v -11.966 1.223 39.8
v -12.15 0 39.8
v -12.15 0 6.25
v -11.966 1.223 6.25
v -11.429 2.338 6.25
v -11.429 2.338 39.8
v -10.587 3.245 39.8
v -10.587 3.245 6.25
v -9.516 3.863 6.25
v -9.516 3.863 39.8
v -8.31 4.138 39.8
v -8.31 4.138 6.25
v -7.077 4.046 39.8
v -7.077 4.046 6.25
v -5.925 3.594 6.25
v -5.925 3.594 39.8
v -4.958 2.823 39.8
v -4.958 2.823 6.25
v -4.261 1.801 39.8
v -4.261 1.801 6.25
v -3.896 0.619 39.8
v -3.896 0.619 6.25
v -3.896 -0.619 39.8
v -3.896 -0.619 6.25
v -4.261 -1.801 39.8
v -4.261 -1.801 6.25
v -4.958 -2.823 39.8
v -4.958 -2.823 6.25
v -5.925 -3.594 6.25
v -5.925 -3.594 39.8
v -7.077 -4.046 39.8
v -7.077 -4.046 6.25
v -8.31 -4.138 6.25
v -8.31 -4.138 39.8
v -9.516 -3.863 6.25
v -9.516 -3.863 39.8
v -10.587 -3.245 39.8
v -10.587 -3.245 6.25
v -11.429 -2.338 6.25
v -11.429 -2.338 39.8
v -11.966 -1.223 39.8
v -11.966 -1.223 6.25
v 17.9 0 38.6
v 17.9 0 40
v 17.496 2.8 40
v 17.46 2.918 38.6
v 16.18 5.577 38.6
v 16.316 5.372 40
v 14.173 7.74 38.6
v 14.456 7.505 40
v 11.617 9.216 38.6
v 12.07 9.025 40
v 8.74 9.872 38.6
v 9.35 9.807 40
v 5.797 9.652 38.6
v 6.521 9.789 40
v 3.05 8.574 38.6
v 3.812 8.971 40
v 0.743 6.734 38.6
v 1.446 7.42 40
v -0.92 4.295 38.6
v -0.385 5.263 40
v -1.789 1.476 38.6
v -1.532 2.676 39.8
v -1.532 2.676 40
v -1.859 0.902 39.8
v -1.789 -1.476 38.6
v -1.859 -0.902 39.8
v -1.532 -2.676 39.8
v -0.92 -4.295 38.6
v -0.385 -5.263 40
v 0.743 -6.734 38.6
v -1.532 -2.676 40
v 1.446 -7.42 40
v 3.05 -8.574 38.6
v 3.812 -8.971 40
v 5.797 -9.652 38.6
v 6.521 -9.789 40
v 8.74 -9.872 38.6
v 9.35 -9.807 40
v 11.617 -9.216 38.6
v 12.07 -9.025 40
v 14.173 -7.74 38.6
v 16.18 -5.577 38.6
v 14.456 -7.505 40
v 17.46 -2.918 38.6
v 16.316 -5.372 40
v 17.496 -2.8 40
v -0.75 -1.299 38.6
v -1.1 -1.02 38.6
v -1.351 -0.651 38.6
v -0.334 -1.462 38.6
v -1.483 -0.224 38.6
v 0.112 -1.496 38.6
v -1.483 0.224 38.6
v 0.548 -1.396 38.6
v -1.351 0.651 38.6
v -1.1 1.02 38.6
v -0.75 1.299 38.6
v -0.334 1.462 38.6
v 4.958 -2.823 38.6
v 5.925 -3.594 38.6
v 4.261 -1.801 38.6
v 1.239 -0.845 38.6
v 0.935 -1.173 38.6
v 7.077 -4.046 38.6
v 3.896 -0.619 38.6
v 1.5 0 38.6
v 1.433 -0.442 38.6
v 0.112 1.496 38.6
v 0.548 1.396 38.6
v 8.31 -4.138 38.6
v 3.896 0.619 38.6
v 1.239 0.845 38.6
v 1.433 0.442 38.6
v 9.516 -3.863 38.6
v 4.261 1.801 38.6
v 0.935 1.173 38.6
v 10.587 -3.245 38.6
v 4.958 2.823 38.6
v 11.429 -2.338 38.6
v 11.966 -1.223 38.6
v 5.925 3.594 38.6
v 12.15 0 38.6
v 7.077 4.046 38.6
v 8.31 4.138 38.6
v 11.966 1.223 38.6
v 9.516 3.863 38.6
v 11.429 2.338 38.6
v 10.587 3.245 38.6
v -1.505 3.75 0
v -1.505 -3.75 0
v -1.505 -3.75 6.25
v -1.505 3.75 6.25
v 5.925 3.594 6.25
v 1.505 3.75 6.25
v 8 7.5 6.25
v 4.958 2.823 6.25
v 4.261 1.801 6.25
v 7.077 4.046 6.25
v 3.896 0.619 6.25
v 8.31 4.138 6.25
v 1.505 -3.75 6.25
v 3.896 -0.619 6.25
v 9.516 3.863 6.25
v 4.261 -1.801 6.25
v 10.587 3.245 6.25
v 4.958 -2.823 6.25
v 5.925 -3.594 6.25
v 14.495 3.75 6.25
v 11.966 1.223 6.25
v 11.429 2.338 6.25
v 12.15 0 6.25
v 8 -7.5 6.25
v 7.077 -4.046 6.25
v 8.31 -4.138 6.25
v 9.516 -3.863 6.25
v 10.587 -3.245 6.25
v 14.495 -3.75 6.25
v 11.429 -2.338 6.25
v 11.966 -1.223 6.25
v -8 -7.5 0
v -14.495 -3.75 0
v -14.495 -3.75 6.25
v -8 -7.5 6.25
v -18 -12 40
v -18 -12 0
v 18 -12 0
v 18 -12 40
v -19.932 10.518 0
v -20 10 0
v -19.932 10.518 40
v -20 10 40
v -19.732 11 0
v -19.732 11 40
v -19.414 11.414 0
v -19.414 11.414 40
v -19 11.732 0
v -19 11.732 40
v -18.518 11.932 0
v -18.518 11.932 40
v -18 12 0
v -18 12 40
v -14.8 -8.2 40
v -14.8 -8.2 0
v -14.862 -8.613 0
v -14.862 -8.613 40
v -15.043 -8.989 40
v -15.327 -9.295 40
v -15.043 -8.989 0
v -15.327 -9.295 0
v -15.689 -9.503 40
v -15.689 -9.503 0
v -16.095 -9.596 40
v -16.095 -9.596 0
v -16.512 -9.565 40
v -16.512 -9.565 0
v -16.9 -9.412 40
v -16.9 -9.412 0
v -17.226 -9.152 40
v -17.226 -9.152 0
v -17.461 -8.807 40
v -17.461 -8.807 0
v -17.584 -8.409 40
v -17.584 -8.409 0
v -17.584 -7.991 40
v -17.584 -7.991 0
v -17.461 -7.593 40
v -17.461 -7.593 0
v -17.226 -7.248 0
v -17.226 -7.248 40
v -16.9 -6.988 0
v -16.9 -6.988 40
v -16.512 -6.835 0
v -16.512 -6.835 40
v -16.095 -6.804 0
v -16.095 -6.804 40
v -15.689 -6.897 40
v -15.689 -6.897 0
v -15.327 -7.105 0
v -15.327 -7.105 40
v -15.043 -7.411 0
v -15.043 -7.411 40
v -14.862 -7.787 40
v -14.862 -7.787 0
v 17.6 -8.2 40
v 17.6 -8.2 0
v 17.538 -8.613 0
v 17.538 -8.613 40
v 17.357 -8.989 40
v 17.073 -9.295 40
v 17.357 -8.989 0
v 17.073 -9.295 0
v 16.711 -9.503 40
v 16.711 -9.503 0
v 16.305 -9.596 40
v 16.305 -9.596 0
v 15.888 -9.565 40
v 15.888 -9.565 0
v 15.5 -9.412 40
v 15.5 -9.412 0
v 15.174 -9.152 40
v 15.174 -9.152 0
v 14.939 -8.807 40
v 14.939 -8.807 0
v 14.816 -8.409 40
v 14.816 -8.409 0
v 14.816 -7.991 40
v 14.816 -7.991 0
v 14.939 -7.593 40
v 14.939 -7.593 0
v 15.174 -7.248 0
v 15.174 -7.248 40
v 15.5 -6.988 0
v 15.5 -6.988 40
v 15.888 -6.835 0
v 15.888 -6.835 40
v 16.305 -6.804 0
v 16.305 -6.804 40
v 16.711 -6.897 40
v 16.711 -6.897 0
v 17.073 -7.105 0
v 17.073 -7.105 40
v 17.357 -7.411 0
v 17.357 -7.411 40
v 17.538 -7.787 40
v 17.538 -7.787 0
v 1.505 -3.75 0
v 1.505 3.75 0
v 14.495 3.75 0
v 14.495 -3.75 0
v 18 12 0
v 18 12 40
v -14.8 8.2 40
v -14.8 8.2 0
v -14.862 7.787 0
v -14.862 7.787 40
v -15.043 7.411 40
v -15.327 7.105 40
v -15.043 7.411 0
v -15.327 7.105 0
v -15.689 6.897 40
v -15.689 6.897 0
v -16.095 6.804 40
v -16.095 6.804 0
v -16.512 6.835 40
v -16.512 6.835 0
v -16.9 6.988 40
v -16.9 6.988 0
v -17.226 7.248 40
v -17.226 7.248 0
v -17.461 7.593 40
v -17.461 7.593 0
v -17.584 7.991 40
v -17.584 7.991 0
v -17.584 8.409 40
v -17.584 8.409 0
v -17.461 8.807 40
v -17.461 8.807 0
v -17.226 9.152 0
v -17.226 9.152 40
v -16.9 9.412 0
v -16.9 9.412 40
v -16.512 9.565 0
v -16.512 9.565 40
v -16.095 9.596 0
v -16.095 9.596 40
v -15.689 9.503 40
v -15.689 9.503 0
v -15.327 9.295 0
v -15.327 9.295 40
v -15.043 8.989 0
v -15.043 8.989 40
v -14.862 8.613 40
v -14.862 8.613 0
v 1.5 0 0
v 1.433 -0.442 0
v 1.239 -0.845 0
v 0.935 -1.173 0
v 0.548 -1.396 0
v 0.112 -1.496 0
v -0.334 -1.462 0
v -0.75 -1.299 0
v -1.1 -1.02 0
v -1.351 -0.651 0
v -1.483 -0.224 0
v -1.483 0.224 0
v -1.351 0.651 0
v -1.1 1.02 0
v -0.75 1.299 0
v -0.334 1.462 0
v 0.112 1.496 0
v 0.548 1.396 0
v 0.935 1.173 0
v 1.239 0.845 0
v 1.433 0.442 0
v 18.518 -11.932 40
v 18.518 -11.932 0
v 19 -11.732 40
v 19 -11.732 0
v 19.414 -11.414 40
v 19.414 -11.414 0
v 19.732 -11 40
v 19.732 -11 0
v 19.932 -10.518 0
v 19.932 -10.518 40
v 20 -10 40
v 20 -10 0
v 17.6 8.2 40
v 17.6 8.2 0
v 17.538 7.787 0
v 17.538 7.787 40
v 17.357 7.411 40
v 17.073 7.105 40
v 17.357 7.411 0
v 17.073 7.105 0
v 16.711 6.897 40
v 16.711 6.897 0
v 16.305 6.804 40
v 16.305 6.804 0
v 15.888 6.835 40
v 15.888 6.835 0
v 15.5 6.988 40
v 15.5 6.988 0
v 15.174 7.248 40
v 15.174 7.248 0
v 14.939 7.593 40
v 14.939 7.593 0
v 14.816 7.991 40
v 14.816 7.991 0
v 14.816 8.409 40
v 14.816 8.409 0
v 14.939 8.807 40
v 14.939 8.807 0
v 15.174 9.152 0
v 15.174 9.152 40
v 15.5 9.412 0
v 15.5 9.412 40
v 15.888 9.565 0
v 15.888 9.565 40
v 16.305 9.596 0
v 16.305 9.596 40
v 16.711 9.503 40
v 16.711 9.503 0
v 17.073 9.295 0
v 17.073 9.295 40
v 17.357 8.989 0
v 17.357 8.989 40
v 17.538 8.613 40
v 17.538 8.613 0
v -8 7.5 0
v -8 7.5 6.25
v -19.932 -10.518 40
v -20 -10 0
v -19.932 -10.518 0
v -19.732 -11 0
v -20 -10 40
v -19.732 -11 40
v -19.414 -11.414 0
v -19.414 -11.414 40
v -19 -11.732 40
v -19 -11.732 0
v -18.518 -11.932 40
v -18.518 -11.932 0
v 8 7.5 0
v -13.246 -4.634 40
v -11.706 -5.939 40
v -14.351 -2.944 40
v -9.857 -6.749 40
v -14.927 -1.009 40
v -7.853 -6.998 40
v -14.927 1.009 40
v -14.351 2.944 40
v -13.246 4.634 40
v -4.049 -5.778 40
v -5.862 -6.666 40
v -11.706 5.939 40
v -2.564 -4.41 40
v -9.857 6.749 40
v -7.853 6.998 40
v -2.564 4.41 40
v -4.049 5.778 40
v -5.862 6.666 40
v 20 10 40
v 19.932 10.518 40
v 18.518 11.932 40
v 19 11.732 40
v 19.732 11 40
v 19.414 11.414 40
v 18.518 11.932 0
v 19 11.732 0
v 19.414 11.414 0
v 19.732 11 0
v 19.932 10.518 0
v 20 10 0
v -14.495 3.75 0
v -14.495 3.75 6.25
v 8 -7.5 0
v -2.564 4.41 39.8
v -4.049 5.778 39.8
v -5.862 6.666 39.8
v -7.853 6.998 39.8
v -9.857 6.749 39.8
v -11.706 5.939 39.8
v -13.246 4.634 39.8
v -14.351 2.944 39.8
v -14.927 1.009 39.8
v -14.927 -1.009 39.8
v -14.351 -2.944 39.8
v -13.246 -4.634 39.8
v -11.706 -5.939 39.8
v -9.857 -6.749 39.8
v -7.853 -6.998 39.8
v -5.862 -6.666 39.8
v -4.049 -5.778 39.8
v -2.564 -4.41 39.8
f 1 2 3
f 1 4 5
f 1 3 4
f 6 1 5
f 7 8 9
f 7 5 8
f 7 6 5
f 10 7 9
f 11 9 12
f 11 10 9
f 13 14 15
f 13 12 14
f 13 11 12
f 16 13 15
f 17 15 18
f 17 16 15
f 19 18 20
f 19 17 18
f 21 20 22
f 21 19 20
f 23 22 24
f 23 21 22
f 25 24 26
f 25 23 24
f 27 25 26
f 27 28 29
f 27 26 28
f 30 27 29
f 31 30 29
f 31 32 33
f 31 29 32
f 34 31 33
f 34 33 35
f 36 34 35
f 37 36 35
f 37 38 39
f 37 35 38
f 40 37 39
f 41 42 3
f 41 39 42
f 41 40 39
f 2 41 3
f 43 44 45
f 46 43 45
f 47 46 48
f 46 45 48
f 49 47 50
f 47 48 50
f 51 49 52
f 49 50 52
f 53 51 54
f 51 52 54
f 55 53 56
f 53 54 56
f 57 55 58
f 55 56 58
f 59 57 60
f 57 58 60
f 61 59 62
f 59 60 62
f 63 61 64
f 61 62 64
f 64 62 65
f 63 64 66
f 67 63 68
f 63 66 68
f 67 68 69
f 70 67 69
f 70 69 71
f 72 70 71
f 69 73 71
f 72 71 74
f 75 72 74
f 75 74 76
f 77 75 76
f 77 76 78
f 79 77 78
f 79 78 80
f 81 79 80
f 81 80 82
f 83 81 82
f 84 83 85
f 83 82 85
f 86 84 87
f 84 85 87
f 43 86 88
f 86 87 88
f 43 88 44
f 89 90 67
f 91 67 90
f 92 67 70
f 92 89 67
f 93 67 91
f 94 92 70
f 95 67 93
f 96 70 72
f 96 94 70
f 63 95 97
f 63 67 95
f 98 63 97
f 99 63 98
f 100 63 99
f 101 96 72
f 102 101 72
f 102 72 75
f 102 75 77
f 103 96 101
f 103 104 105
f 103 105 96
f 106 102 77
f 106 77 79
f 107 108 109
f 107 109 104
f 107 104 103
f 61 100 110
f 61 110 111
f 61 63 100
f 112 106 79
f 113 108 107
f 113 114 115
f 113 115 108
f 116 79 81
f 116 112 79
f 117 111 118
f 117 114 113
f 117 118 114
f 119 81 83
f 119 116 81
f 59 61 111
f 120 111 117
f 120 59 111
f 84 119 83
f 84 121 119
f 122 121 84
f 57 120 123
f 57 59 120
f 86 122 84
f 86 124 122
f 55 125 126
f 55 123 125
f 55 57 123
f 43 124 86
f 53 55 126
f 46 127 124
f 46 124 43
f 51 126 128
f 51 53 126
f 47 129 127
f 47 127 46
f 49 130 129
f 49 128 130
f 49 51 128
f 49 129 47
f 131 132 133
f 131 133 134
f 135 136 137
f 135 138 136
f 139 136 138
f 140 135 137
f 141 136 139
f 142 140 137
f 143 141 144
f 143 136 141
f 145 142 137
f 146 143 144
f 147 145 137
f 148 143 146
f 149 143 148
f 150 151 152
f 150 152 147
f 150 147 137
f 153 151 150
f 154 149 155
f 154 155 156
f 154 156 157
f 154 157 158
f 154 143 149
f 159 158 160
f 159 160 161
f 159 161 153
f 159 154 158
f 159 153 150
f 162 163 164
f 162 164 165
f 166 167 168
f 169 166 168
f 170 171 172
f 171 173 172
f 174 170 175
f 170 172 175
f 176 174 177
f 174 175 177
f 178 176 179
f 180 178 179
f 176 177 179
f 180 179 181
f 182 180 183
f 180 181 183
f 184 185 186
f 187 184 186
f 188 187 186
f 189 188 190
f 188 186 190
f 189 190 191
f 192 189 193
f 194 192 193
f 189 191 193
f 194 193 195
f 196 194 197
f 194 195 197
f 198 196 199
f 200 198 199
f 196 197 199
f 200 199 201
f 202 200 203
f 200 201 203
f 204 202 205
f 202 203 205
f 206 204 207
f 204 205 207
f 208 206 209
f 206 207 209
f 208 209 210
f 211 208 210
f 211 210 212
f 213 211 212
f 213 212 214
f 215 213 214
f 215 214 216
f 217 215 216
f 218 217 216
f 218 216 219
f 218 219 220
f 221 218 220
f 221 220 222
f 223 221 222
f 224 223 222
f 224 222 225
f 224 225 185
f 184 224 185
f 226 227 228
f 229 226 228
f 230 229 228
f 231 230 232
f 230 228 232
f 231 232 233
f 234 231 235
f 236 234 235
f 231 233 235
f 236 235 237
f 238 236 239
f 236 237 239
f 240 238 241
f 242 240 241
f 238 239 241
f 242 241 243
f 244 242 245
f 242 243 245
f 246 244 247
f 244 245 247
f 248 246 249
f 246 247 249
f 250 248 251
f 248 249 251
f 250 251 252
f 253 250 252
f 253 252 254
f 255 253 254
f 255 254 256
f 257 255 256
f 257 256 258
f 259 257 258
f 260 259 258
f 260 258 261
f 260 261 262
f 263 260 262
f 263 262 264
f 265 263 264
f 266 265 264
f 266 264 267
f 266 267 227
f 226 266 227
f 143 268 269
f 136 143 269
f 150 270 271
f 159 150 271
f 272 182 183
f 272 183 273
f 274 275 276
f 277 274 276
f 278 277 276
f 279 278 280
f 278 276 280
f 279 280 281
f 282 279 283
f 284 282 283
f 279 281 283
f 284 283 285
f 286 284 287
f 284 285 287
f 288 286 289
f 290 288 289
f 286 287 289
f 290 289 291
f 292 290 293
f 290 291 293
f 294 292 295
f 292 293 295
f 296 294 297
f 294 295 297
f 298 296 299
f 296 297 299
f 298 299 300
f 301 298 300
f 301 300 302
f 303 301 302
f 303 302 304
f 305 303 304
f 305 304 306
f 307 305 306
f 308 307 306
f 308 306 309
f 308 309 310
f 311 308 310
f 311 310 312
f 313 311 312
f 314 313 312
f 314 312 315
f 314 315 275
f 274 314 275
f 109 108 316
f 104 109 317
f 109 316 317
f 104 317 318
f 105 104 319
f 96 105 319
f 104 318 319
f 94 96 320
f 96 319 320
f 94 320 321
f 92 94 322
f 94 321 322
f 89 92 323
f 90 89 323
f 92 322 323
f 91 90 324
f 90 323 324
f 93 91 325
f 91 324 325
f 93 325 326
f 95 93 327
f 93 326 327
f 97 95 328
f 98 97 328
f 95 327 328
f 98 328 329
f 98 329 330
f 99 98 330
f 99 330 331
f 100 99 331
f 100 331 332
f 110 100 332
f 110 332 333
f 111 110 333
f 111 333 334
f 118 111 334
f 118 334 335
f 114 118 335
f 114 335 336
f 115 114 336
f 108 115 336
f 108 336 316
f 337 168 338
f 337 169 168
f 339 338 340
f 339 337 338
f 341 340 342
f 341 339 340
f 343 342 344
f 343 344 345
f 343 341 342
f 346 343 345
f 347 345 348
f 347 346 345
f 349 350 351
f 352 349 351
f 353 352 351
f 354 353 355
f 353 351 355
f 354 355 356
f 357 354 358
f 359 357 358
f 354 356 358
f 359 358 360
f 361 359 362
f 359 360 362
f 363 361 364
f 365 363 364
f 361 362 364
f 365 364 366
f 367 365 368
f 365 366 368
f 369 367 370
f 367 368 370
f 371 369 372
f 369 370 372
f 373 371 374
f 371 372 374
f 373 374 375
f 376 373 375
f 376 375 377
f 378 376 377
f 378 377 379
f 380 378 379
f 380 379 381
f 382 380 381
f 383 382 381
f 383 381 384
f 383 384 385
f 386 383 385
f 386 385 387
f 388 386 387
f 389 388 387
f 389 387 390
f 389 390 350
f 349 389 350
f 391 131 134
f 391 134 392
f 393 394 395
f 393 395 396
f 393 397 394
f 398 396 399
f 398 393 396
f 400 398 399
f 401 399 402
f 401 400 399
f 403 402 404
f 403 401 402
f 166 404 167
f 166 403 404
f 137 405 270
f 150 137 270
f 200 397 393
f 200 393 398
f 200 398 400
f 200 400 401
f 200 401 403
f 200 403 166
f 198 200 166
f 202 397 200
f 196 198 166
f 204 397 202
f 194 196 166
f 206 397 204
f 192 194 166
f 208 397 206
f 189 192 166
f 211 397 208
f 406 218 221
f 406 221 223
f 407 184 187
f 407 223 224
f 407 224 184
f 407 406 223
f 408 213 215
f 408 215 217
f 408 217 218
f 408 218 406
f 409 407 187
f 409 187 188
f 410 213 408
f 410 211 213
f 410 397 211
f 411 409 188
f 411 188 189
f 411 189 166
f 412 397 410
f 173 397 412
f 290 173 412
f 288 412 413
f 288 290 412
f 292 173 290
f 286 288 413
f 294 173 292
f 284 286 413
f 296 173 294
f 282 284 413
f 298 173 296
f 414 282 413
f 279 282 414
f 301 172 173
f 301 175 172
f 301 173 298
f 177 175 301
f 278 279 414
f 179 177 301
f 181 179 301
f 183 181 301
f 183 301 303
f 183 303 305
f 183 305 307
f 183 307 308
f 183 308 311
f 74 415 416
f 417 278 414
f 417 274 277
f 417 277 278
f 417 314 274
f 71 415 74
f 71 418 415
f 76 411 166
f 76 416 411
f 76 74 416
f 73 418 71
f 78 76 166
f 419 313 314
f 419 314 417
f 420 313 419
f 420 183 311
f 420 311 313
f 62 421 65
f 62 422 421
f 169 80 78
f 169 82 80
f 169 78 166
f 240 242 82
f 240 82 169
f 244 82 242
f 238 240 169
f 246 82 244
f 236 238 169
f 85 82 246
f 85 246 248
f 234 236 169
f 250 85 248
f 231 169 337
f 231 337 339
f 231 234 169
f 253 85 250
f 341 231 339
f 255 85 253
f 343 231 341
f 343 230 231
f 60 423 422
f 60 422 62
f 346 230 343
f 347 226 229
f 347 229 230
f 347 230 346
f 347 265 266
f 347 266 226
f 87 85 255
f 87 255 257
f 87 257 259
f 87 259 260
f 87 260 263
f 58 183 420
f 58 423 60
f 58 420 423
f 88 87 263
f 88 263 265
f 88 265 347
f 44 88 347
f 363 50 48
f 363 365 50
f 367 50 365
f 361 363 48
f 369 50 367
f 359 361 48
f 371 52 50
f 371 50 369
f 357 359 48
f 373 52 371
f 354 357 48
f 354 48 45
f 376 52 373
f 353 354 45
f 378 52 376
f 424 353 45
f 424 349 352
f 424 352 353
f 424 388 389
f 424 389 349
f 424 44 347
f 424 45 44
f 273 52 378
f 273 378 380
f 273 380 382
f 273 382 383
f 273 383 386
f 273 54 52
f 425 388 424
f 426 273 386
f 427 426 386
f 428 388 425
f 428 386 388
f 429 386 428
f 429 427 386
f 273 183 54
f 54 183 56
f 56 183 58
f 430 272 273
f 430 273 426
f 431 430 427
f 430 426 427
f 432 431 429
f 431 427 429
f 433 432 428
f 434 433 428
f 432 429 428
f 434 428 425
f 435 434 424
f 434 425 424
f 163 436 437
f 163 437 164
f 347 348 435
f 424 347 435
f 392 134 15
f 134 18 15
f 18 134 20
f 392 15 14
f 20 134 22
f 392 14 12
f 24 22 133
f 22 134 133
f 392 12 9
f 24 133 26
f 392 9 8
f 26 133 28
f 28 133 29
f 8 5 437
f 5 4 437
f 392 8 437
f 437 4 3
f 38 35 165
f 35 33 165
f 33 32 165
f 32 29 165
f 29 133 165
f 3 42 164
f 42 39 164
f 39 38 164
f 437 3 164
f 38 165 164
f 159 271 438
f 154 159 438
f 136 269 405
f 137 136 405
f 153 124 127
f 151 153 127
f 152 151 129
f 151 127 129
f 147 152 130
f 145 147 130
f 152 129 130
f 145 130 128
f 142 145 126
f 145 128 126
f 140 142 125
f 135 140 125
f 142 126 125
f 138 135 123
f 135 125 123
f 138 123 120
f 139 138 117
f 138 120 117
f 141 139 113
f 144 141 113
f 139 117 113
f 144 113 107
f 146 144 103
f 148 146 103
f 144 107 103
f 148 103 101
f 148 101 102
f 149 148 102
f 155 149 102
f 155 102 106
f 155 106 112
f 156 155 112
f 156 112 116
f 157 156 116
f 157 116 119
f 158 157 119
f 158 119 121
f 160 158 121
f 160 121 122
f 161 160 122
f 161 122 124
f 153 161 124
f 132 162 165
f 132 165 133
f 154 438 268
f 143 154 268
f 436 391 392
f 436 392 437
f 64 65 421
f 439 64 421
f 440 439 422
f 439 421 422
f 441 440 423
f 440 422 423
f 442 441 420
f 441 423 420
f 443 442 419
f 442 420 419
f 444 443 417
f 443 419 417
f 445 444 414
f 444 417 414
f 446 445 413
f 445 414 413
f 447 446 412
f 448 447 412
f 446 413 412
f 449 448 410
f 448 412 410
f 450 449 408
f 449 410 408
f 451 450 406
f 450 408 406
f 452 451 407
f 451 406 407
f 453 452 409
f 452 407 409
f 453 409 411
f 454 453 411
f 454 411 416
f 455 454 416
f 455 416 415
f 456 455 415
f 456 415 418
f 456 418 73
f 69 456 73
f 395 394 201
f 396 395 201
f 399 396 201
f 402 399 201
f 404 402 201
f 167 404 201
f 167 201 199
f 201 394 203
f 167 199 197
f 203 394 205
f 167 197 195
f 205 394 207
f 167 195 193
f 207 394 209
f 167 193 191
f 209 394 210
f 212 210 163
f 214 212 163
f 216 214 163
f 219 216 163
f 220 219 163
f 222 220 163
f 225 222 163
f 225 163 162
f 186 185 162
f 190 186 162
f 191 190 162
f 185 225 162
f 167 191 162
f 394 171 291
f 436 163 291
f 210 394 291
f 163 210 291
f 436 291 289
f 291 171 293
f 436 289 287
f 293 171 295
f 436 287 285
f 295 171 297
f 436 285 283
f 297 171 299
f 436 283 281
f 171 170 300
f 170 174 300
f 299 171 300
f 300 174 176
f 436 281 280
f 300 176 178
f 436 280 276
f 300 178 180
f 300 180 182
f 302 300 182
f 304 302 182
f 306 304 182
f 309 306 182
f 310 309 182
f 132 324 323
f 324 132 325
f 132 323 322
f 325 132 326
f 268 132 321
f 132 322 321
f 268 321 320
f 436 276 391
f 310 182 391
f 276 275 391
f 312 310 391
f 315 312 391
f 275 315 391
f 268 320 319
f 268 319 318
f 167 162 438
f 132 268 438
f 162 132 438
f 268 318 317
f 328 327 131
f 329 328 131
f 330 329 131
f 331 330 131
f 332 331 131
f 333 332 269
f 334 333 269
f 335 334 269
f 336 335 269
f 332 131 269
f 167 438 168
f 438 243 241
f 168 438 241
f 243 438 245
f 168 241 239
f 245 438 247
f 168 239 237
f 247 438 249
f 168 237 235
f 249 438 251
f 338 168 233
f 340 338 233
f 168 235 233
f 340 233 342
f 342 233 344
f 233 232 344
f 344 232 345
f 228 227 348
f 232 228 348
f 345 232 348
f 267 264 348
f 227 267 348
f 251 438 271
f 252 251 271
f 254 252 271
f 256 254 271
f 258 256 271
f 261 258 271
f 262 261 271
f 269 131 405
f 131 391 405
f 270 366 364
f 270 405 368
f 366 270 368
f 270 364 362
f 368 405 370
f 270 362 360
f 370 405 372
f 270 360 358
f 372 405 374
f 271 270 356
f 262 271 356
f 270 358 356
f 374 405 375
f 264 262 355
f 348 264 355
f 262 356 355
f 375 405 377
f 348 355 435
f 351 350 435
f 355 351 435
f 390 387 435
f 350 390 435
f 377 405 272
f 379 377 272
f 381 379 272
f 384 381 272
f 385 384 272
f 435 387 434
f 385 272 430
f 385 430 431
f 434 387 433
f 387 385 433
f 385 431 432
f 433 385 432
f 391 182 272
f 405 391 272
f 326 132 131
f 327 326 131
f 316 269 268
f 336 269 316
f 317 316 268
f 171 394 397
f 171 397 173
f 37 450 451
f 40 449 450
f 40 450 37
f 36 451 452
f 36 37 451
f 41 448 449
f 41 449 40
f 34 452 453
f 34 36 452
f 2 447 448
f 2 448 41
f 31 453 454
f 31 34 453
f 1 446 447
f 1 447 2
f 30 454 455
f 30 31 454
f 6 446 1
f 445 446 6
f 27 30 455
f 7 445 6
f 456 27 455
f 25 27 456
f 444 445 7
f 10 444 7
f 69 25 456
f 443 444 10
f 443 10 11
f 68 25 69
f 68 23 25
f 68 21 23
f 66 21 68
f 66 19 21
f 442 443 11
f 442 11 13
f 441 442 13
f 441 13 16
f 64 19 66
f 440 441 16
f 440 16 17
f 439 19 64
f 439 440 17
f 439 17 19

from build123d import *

# Parameters (mm, degrees)
SKETCH041_W     = 40
SKETCH041_H     = 24
PAD012_DEPTH    = 40
SKETCH042_R     = 4.15
HOLE017_DEPTH   = 50
SKETCH043_R     = 9.9
POCKET012_DEPTH = 1.4
POCKET021_DEPTH = 6.25
SKETCH066_R     = 1.4
HOLE026_DEPTH   = 50
SKETCH067_R     = 1.5
HOLE027_DEPTH   = 50
SKETCH068_R     = 7
POCKET022_DEPTH = 0.2
FILLET024_R     = 2


with BuildPart() as part:
    # Sketch041 → Pad012 (new body)
    with BuildSketch(Plane.XY):
        Rectangle(SKETCH041_W, SKETCH041_H)
    extrude(amount=PAD012_DEPTH)

    # Sketch042 (on Face6 of Pad012) → Hole017 (cut)
    with BuildSketch(Plane.XY.offset(40)):
        with Locations((8, 0)):
            Circle(SKETCH042_R)
    hole017 = extrude(amount=-HOLE017_DEPTH, mode=Mode.SUBTRACT)

    # Mirrored019: Hole017 across Sketch042 V_Axis
    add(hole017.mirror(Plane(origin=(0, 0, 40), x_dir=(0, 0, 1), z_dir=(1, 0, 0))), mode=Mode.SUBTRACT)

    # Sketch043 (on Face5 of Mirrored019) → Pocket012 (cut)
    with BuildSketch(Plane.XY.offset(40)):
        with Locations((8, 0)):
            Circle(SKETCH043_R)
    extrude(amount=-POCKET012_DEPTH, mode=Mode.SUBTRACT)

    # Sketch065 (on Face4 of Pocket012) → Pocket021 (cut)
    with BuildSketch(Plane(origin=(0, 0, 0), x_dir=(1, 0, 0), z_dir=(0, 0, -1))):
        Polygon((14.495191, 3.75), (8, 7.5), (1.504809, 3.75), (1.504809, -3.75), (8, -7.5), (14.495191, -3.75), align=None)
    pocket021 = extrude(amount=-POCKET021_DEPTH, mode=Mode.SUBTRACT)

    # Mirrored029: Pocket021 across Sketch065 V_Axis
    add(pocket021.mirror(Plane(origin=(0, 0, 0), x_dir=(0, 0, -1), z_dir=(1, 0, 0))), mode=Mode.SUBTRACT)

    # Sketch066 (on Face4 of Mirrored029) → Hole026 (cut)
    with BuildSketch(Plane(origin=(0, 0, 0), x_dir=(1, 0, 0), z_dir=(0, 0, -1))):
        with Locations((-16.2, 8.2)):
            Circle(SKETCH066_R)
        with Locations((-16.2, -8.2)):
            Circle(SKETCH066_R)
        with Locations((16.2, 8.2)):
            Circle(SKETCH066_R)
        with Locations((16.2, -8.2)):
            Circle(SKETCH066_R)
    extrude(amount=-HOLE026_DEPTH, mode=Mode.SUBTRACT)

    # Sketch067 (on Face4 of Hole026) → Hole027 (cut)
    with BuildSketch(Plane(origin=(0, 0, 0), x_dir=(1, 0, 0), z_dir=(0, 0, -1))):
        Circle(SKETCH067_R)
    extrude(amount=-HOLE027_DEPTH, mode=Mode.SUBTRACT)

    # Sketch068 (on Face5 of Hole027) → Pocket022 (cut)
    with BuildSketch(Plane.XY.offset(40)):
        with Locations((-8, 0)):
            Circle(SKETCH068_R)
    extrude(amount=-POCKET022_DEPTH, mode=Mode.SUBTRACT)

    # Fillet024
    fillet024_edges = [part.edges().sort_by_distance(p)[0] for p in [
        (20, 12, 20),
        (-20, 12, 20),
        (20, -12, 20),
        (-20, -12, 20),
    ]]
    fillet(fillet024_edges, radius=FILLET024_R)


solid = part.part
